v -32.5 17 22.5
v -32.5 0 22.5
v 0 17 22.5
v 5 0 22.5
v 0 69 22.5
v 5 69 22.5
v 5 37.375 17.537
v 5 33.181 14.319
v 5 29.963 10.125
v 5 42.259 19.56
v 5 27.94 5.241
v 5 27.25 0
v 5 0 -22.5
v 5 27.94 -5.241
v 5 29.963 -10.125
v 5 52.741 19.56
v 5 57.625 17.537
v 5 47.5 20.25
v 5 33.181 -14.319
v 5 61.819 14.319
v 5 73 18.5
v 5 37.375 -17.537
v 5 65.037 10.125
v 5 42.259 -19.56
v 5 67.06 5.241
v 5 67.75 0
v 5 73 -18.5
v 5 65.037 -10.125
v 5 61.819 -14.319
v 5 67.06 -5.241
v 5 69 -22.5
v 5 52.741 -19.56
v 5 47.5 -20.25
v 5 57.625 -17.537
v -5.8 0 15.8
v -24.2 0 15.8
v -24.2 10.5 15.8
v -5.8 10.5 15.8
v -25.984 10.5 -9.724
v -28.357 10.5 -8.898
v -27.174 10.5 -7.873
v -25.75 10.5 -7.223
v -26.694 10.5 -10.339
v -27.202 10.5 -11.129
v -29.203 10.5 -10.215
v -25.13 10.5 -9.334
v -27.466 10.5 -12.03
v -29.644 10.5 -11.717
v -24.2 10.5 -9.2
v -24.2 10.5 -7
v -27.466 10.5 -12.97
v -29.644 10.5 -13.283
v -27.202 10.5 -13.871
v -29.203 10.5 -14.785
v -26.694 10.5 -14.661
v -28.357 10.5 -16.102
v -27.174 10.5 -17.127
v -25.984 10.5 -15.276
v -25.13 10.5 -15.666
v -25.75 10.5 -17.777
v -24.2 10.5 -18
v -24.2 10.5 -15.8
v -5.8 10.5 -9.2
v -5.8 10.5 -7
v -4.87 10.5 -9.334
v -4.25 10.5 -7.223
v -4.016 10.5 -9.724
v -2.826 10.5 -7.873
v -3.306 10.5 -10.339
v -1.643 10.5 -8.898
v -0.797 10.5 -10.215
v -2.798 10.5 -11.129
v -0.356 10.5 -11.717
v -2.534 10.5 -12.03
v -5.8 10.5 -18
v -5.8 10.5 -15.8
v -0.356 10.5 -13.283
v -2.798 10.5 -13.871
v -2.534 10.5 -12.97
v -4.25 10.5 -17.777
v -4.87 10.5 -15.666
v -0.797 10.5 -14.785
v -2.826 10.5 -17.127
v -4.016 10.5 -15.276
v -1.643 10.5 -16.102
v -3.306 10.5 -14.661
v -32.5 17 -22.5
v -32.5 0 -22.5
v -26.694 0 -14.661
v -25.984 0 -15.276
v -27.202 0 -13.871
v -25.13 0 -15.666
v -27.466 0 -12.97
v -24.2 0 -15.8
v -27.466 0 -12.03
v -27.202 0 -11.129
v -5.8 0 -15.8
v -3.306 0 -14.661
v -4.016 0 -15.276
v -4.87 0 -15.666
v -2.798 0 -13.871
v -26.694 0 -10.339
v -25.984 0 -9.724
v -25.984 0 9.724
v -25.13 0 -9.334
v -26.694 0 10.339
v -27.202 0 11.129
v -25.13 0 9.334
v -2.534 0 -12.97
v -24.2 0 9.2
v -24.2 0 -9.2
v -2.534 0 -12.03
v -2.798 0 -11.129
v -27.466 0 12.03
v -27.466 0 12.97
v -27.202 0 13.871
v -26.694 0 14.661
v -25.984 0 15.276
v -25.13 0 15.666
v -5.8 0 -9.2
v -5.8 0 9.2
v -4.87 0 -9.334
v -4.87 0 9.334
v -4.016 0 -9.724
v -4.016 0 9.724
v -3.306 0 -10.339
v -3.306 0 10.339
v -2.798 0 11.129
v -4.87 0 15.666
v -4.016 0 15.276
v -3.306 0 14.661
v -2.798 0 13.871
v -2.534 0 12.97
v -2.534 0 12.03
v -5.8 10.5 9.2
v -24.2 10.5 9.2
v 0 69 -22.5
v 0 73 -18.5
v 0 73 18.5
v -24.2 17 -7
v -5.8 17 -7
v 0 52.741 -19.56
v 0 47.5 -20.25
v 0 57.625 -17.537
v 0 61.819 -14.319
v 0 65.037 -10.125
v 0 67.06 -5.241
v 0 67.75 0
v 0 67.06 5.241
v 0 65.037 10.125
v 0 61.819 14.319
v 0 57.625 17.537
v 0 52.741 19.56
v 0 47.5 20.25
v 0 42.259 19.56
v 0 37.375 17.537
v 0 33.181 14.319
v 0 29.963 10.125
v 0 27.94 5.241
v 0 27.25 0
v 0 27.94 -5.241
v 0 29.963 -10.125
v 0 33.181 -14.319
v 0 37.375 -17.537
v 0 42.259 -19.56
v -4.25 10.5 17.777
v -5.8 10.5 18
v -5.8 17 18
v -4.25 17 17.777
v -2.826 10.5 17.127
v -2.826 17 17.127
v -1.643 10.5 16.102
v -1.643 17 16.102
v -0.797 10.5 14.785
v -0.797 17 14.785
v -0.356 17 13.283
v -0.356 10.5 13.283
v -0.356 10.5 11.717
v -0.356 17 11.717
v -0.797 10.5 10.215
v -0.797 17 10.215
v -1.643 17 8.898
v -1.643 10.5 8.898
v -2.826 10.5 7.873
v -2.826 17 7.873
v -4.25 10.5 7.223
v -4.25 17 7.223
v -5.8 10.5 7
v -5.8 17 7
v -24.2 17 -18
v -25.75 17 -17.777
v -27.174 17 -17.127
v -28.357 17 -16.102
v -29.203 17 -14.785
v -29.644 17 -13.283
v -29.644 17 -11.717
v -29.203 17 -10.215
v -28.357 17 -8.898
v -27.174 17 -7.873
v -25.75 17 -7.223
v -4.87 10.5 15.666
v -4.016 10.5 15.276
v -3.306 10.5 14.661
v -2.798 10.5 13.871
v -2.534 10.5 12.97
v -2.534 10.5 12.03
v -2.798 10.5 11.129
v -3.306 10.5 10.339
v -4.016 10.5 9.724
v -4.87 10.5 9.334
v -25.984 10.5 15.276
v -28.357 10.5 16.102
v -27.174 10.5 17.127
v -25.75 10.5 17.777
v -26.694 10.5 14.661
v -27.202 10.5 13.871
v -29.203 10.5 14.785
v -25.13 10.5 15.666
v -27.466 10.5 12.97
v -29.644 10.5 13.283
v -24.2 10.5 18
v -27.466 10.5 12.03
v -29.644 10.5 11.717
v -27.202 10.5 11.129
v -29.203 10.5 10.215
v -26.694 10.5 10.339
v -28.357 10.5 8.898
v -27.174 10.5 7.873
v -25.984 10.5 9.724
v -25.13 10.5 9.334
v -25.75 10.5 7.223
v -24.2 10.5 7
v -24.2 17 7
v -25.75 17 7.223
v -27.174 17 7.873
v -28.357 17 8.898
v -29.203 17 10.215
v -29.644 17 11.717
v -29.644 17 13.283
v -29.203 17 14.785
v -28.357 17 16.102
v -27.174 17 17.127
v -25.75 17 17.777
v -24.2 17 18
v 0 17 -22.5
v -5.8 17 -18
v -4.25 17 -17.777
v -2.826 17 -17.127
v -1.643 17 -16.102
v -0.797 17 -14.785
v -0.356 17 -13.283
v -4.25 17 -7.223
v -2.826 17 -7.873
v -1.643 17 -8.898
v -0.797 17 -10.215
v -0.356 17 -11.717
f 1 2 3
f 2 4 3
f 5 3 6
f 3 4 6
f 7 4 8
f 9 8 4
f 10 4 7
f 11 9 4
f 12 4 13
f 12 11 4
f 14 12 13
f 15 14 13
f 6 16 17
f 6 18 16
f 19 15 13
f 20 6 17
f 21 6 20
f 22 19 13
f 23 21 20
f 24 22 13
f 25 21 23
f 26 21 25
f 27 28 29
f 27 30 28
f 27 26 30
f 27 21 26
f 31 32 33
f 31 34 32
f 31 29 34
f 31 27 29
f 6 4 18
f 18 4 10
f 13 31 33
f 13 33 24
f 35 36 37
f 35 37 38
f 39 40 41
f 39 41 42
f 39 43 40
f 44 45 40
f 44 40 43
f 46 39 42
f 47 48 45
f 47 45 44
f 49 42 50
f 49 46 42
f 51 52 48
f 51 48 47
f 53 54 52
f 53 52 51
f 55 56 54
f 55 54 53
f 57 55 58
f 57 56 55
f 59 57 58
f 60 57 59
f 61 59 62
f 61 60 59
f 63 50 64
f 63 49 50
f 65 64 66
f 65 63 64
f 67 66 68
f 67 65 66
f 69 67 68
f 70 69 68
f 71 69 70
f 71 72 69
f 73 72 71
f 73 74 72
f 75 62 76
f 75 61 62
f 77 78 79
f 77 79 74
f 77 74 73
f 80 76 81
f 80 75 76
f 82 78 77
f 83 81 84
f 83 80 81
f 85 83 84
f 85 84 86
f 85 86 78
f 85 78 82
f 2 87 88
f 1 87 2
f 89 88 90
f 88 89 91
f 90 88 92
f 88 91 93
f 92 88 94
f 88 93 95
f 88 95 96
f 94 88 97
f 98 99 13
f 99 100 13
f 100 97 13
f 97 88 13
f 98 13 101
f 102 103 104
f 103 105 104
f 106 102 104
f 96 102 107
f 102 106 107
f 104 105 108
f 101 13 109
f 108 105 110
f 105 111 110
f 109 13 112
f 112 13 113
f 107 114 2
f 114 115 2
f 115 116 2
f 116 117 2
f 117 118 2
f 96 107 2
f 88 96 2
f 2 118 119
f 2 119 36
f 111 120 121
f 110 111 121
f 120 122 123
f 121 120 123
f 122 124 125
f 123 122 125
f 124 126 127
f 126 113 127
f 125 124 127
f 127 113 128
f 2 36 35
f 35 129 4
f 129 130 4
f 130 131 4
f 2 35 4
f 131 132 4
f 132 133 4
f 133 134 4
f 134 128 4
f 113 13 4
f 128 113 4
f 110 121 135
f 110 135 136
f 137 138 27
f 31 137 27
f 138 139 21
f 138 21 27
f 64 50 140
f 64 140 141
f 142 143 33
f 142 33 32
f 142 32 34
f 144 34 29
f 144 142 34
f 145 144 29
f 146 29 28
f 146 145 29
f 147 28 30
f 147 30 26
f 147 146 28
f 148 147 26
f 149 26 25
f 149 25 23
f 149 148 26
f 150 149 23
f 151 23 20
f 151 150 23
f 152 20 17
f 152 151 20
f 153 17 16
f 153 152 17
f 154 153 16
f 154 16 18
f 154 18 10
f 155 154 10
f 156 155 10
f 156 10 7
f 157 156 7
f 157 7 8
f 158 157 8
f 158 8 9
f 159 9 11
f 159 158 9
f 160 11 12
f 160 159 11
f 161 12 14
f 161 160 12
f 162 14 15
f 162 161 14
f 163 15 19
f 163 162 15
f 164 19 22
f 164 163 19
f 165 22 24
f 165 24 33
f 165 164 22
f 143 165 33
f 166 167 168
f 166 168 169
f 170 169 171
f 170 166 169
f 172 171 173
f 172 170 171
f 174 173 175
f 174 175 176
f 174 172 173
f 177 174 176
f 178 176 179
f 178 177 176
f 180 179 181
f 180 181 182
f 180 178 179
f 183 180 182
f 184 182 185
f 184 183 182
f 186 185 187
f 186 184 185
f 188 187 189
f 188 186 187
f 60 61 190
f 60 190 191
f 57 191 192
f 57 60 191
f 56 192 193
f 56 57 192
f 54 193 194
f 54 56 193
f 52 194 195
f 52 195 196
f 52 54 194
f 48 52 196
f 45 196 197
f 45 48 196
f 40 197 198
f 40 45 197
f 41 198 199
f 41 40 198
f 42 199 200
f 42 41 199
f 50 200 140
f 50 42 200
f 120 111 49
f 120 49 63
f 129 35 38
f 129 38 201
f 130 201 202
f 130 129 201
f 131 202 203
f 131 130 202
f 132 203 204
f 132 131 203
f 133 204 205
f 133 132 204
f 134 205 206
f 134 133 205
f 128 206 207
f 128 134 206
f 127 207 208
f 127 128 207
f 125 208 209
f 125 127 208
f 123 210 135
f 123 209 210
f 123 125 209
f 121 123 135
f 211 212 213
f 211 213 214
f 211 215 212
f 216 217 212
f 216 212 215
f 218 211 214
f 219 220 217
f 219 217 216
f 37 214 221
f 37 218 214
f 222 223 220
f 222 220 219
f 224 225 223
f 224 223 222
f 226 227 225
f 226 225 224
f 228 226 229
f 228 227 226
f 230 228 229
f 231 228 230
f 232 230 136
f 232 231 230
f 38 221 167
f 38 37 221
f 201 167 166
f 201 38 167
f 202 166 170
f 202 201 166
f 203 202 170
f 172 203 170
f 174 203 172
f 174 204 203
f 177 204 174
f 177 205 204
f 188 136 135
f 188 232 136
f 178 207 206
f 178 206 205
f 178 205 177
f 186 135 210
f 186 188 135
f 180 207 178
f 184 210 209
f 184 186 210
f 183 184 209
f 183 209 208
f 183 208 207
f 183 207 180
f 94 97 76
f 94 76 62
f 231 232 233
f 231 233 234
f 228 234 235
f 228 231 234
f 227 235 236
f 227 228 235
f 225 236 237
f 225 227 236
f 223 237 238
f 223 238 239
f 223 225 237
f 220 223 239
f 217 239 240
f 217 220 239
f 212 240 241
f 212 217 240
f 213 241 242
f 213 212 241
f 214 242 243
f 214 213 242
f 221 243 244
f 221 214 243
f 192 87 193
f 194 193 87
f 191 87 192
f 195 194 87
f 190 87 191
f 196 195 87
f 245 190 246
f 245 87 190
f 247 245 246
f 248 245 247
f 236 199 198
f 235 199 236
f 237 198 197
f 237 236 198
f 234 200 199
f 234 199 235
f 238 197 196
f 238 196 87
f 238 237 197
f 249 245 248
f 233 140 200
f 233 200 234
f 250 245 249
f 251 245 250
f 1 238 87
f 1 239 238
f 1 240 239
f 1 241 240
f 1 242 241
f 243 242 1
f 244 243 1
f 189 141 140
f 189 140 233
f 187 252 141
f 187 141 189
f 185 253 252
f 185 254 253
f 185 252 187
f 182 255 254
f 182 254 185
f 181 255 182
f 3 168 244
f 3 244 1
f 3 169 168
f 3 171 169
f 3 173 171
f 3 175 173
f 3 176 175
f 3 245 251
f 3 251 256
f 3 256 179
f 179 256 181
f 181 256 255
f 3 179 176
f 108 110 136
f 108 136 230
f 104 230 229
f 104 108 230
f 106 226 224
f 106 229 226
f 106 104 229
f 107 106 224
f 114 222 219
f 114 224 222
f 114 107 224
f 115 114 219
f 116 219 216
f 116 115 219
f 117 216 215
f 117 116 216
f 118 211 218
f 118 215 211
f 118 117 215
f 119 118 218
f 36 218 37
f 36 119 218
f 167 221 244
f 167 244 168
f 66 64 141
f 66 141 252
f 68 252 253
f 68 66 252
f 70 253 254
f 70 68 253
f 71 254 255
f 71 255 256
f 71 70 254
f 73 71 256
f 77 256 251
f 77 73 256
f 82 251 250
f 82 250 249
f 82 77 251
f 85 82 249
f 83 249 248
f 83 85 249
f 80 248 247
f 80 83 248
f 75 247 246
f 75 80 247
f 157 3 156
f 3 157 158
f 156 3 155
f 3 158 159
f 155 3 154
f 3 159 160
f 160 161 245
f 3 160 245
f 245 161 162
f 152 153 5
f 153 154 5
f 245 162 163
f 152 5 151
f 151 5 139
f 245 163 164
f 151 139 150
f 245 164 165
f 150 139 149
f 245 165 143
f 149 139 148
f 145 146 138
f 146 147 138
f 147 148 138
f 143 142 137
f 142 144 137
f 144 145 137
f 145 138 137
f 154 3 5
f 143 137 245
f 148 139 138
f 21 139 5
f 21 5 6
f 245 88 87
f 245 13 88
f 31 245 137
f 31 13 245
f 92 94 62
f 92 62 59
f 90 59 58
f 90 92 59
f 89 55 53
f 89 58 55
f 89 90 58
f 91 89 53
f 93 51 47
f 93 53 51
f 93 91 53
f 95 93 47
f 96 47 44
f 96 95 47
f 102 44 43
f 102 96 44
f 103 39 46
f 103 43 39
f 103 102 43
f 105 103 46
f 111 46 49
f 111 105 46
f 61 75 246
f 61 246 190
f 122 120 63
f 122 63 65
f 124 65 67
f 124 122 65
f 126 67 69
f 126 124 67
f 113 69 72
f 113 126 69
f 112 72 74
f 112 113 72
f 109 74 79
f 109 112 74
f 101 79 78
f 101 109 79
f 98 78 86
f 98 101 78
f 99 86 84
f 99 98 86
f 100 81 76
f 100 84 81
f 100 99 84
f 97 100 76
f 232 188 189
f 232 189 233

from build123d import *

# Parameters (mm, degrees)
SKETCH1_W                                      = 45
SKETCH1_H                                      = 73
SKETCH1_R                                      = 20.25
BOSS_EXTRUDE1_DEPTH                            = 5
CHAMFER1_SIZE                                  = 4
SKETCH2_W                                      = 45
SKETCH2_H                                      = 17
BOSS_EXTRUDE2_DEPTH                            = 32.5
CBORE_SLOT_FOR_M6_HEX_SOCKET_HEAD_CAP_SC_DEPTH = 17
CBORE_START                                    = 10.5
CBORE_SLOT_FOR_M6_HEX_SOCKET_HEAD_CA_3_DEPTH   = 6.5


# Read off the part's stored shape, not the designer's step: CBORE SLOT for M6 Hex Socket Head Cap Screw1
with BuildPart() as part:
    # Sketch1 → Boss-Extrude1 (new body)
    with BuildSketch(Plane(origin=(0, 0, 0), x_dir=(0, 0, -1), z_dir=(1, 0, 0))):
        with Locations((0, 36.5)):
            Rectangle(SKETCH1_W, SKETCH1_H)
        with Locations((0, 47.5)):
            Circle(SKETCH1_R, mode=Mode.SUBTRACT)
    extrude(amount=BOSS_EXTRUDE1_DEPTH)

    # Chamfer1
    chamfer1_edges = [part.edges().sort_by_distance(p)[0] for p in [
        (2.5, 73, 22.5),
        (2.5, 73, -22.5),
    ]]
    chamfer(chamfer1_edges, length=CHAMFER1_SIZE)

    # Sketch2 → Boss-Extrude2 (add)
    with BuildSketch(Plane.ZY):
        with Locations((0, 8.5)):
            Rectangle(SKETCH2_W, SKETCH2_H)
    extrude(amount=BOSS_EXTRUDE2_DEPTH)

    # CBORE SLOT for M6 Hex Socket Head Ca 2 → CBORE SLOT for M6 Hex Socket Head Cap Screw1 (cut)
    with BuildSketch(Plane(origin=(0, 0, 0), x_dir=(1, 0, 0), z_dir=(0, 1, 0))):
        with BuildLine():
            Line((-24.2, -15.8), (-5.8, -15.8))
            ThreePointArc((-5.8, -15.8), (-2.5, -12.5), (-5.8, -9.2))
            Line((-5.8, -9.2), (-24.2, -9.2))
            ThreePointArc((-24.2, -9.2), (-27.5, -12.5), (-24.2, -15.8))
        make_face()
        with BuildLine():
            Line((-24.2, 9.2), (-5.8, 9.2))
            ThreePointArc((-5.8, 9.2), (-2.5, 12.5), (-5.8, 15.8))
            Line((-5.8, 15.8), (-24.2, 15.8))
            ThreePointArc((-24.2, 15.8), (-27.5, 12.5), (-24.2, 9.2))
        make_face()
    extrude(amount=CBORE_SLOT_FOR_M6_HEX_SOCKET_HEAD_CAP_SC_DEPTH, mode=Mode.SUBTRACT)

    # CBORE SLOT for M6 Hex Socket Head Ca 3 o → CBORE SLOT for M6 Hex Socket Head Ca 3 (cut)
    # profile 1 of 2: a face of its own
    with BuildSketch(Plane(origin=(0, 0, 0), x_dir=(1, 0, 0), z_dir=(0, 1, 0)).offset(CBORE_START)):
        with BuildLine():
            Line((-24.2, -18), (-5.8, -18))
            ThreePointArc((-5.8, -18), (-0.3, -12.5), (-5.8, -7))
            Line((-5.8, -7), (-24.2, -7))
            ThreePointArc((-24.2, -7), (-29.7, -12.5), (-24.2, -18))
        make_face()
        with BuildLine():
            ThreePointArc((-5.8, -9.2), (-2.5, -12.5), (-5.8, -15.8))
            Line((-5.8, -15.8), (-24.2, -15.8))
            ThreePointArc((-24.2, -15.8), (-27.5, -12.5), (-24.2, -9.2))
            Line((-24.2, -9.2), (-5.8, -9.2))
        make_face(mode=Mode.SUBTRACT)
    # profile 2 of 2: a face of its own
    with BuildSketch(Plane(origin=(0, 0, 0), x_dir=(1, 0, 0), z_dir=(0, 1, 0)).offset(CBORE_START)):
        with BuildLine():
            Line((-24.2, 7), (-5.8, 7))
            ThreePointArc((-5.8, 7), (-0.3, 12.5), (-5.8, 18))
            Line((-5.8, 18), (-24.2, 18))
            ThreePointArc((-24.2, 18), (-29.7, 12.5), (-24.2, 7))
        make_face()
        with BuildLine():
            ThreePointArc((-5.8, 15.8), (-2.5, 12.5), (-5.8, 9.2))
            Line((-5.8, 9.2), (-24.2, 9.2))
            ThreePointArc((-24.2, 9.2), (-27.5, 12.5), (-24.2, 15.8))
            Line((-24.2, 15.8), (-5.8, 15.8))
        make_face(mode=Mode.SUBTRACT)
    extrude(amount=CBORE_SLOT_FOR_M6_HEX_SOCKET_HEAD_CA_3_DEPTH, mode=Mode.SUBTRACT)


solid = part.part
